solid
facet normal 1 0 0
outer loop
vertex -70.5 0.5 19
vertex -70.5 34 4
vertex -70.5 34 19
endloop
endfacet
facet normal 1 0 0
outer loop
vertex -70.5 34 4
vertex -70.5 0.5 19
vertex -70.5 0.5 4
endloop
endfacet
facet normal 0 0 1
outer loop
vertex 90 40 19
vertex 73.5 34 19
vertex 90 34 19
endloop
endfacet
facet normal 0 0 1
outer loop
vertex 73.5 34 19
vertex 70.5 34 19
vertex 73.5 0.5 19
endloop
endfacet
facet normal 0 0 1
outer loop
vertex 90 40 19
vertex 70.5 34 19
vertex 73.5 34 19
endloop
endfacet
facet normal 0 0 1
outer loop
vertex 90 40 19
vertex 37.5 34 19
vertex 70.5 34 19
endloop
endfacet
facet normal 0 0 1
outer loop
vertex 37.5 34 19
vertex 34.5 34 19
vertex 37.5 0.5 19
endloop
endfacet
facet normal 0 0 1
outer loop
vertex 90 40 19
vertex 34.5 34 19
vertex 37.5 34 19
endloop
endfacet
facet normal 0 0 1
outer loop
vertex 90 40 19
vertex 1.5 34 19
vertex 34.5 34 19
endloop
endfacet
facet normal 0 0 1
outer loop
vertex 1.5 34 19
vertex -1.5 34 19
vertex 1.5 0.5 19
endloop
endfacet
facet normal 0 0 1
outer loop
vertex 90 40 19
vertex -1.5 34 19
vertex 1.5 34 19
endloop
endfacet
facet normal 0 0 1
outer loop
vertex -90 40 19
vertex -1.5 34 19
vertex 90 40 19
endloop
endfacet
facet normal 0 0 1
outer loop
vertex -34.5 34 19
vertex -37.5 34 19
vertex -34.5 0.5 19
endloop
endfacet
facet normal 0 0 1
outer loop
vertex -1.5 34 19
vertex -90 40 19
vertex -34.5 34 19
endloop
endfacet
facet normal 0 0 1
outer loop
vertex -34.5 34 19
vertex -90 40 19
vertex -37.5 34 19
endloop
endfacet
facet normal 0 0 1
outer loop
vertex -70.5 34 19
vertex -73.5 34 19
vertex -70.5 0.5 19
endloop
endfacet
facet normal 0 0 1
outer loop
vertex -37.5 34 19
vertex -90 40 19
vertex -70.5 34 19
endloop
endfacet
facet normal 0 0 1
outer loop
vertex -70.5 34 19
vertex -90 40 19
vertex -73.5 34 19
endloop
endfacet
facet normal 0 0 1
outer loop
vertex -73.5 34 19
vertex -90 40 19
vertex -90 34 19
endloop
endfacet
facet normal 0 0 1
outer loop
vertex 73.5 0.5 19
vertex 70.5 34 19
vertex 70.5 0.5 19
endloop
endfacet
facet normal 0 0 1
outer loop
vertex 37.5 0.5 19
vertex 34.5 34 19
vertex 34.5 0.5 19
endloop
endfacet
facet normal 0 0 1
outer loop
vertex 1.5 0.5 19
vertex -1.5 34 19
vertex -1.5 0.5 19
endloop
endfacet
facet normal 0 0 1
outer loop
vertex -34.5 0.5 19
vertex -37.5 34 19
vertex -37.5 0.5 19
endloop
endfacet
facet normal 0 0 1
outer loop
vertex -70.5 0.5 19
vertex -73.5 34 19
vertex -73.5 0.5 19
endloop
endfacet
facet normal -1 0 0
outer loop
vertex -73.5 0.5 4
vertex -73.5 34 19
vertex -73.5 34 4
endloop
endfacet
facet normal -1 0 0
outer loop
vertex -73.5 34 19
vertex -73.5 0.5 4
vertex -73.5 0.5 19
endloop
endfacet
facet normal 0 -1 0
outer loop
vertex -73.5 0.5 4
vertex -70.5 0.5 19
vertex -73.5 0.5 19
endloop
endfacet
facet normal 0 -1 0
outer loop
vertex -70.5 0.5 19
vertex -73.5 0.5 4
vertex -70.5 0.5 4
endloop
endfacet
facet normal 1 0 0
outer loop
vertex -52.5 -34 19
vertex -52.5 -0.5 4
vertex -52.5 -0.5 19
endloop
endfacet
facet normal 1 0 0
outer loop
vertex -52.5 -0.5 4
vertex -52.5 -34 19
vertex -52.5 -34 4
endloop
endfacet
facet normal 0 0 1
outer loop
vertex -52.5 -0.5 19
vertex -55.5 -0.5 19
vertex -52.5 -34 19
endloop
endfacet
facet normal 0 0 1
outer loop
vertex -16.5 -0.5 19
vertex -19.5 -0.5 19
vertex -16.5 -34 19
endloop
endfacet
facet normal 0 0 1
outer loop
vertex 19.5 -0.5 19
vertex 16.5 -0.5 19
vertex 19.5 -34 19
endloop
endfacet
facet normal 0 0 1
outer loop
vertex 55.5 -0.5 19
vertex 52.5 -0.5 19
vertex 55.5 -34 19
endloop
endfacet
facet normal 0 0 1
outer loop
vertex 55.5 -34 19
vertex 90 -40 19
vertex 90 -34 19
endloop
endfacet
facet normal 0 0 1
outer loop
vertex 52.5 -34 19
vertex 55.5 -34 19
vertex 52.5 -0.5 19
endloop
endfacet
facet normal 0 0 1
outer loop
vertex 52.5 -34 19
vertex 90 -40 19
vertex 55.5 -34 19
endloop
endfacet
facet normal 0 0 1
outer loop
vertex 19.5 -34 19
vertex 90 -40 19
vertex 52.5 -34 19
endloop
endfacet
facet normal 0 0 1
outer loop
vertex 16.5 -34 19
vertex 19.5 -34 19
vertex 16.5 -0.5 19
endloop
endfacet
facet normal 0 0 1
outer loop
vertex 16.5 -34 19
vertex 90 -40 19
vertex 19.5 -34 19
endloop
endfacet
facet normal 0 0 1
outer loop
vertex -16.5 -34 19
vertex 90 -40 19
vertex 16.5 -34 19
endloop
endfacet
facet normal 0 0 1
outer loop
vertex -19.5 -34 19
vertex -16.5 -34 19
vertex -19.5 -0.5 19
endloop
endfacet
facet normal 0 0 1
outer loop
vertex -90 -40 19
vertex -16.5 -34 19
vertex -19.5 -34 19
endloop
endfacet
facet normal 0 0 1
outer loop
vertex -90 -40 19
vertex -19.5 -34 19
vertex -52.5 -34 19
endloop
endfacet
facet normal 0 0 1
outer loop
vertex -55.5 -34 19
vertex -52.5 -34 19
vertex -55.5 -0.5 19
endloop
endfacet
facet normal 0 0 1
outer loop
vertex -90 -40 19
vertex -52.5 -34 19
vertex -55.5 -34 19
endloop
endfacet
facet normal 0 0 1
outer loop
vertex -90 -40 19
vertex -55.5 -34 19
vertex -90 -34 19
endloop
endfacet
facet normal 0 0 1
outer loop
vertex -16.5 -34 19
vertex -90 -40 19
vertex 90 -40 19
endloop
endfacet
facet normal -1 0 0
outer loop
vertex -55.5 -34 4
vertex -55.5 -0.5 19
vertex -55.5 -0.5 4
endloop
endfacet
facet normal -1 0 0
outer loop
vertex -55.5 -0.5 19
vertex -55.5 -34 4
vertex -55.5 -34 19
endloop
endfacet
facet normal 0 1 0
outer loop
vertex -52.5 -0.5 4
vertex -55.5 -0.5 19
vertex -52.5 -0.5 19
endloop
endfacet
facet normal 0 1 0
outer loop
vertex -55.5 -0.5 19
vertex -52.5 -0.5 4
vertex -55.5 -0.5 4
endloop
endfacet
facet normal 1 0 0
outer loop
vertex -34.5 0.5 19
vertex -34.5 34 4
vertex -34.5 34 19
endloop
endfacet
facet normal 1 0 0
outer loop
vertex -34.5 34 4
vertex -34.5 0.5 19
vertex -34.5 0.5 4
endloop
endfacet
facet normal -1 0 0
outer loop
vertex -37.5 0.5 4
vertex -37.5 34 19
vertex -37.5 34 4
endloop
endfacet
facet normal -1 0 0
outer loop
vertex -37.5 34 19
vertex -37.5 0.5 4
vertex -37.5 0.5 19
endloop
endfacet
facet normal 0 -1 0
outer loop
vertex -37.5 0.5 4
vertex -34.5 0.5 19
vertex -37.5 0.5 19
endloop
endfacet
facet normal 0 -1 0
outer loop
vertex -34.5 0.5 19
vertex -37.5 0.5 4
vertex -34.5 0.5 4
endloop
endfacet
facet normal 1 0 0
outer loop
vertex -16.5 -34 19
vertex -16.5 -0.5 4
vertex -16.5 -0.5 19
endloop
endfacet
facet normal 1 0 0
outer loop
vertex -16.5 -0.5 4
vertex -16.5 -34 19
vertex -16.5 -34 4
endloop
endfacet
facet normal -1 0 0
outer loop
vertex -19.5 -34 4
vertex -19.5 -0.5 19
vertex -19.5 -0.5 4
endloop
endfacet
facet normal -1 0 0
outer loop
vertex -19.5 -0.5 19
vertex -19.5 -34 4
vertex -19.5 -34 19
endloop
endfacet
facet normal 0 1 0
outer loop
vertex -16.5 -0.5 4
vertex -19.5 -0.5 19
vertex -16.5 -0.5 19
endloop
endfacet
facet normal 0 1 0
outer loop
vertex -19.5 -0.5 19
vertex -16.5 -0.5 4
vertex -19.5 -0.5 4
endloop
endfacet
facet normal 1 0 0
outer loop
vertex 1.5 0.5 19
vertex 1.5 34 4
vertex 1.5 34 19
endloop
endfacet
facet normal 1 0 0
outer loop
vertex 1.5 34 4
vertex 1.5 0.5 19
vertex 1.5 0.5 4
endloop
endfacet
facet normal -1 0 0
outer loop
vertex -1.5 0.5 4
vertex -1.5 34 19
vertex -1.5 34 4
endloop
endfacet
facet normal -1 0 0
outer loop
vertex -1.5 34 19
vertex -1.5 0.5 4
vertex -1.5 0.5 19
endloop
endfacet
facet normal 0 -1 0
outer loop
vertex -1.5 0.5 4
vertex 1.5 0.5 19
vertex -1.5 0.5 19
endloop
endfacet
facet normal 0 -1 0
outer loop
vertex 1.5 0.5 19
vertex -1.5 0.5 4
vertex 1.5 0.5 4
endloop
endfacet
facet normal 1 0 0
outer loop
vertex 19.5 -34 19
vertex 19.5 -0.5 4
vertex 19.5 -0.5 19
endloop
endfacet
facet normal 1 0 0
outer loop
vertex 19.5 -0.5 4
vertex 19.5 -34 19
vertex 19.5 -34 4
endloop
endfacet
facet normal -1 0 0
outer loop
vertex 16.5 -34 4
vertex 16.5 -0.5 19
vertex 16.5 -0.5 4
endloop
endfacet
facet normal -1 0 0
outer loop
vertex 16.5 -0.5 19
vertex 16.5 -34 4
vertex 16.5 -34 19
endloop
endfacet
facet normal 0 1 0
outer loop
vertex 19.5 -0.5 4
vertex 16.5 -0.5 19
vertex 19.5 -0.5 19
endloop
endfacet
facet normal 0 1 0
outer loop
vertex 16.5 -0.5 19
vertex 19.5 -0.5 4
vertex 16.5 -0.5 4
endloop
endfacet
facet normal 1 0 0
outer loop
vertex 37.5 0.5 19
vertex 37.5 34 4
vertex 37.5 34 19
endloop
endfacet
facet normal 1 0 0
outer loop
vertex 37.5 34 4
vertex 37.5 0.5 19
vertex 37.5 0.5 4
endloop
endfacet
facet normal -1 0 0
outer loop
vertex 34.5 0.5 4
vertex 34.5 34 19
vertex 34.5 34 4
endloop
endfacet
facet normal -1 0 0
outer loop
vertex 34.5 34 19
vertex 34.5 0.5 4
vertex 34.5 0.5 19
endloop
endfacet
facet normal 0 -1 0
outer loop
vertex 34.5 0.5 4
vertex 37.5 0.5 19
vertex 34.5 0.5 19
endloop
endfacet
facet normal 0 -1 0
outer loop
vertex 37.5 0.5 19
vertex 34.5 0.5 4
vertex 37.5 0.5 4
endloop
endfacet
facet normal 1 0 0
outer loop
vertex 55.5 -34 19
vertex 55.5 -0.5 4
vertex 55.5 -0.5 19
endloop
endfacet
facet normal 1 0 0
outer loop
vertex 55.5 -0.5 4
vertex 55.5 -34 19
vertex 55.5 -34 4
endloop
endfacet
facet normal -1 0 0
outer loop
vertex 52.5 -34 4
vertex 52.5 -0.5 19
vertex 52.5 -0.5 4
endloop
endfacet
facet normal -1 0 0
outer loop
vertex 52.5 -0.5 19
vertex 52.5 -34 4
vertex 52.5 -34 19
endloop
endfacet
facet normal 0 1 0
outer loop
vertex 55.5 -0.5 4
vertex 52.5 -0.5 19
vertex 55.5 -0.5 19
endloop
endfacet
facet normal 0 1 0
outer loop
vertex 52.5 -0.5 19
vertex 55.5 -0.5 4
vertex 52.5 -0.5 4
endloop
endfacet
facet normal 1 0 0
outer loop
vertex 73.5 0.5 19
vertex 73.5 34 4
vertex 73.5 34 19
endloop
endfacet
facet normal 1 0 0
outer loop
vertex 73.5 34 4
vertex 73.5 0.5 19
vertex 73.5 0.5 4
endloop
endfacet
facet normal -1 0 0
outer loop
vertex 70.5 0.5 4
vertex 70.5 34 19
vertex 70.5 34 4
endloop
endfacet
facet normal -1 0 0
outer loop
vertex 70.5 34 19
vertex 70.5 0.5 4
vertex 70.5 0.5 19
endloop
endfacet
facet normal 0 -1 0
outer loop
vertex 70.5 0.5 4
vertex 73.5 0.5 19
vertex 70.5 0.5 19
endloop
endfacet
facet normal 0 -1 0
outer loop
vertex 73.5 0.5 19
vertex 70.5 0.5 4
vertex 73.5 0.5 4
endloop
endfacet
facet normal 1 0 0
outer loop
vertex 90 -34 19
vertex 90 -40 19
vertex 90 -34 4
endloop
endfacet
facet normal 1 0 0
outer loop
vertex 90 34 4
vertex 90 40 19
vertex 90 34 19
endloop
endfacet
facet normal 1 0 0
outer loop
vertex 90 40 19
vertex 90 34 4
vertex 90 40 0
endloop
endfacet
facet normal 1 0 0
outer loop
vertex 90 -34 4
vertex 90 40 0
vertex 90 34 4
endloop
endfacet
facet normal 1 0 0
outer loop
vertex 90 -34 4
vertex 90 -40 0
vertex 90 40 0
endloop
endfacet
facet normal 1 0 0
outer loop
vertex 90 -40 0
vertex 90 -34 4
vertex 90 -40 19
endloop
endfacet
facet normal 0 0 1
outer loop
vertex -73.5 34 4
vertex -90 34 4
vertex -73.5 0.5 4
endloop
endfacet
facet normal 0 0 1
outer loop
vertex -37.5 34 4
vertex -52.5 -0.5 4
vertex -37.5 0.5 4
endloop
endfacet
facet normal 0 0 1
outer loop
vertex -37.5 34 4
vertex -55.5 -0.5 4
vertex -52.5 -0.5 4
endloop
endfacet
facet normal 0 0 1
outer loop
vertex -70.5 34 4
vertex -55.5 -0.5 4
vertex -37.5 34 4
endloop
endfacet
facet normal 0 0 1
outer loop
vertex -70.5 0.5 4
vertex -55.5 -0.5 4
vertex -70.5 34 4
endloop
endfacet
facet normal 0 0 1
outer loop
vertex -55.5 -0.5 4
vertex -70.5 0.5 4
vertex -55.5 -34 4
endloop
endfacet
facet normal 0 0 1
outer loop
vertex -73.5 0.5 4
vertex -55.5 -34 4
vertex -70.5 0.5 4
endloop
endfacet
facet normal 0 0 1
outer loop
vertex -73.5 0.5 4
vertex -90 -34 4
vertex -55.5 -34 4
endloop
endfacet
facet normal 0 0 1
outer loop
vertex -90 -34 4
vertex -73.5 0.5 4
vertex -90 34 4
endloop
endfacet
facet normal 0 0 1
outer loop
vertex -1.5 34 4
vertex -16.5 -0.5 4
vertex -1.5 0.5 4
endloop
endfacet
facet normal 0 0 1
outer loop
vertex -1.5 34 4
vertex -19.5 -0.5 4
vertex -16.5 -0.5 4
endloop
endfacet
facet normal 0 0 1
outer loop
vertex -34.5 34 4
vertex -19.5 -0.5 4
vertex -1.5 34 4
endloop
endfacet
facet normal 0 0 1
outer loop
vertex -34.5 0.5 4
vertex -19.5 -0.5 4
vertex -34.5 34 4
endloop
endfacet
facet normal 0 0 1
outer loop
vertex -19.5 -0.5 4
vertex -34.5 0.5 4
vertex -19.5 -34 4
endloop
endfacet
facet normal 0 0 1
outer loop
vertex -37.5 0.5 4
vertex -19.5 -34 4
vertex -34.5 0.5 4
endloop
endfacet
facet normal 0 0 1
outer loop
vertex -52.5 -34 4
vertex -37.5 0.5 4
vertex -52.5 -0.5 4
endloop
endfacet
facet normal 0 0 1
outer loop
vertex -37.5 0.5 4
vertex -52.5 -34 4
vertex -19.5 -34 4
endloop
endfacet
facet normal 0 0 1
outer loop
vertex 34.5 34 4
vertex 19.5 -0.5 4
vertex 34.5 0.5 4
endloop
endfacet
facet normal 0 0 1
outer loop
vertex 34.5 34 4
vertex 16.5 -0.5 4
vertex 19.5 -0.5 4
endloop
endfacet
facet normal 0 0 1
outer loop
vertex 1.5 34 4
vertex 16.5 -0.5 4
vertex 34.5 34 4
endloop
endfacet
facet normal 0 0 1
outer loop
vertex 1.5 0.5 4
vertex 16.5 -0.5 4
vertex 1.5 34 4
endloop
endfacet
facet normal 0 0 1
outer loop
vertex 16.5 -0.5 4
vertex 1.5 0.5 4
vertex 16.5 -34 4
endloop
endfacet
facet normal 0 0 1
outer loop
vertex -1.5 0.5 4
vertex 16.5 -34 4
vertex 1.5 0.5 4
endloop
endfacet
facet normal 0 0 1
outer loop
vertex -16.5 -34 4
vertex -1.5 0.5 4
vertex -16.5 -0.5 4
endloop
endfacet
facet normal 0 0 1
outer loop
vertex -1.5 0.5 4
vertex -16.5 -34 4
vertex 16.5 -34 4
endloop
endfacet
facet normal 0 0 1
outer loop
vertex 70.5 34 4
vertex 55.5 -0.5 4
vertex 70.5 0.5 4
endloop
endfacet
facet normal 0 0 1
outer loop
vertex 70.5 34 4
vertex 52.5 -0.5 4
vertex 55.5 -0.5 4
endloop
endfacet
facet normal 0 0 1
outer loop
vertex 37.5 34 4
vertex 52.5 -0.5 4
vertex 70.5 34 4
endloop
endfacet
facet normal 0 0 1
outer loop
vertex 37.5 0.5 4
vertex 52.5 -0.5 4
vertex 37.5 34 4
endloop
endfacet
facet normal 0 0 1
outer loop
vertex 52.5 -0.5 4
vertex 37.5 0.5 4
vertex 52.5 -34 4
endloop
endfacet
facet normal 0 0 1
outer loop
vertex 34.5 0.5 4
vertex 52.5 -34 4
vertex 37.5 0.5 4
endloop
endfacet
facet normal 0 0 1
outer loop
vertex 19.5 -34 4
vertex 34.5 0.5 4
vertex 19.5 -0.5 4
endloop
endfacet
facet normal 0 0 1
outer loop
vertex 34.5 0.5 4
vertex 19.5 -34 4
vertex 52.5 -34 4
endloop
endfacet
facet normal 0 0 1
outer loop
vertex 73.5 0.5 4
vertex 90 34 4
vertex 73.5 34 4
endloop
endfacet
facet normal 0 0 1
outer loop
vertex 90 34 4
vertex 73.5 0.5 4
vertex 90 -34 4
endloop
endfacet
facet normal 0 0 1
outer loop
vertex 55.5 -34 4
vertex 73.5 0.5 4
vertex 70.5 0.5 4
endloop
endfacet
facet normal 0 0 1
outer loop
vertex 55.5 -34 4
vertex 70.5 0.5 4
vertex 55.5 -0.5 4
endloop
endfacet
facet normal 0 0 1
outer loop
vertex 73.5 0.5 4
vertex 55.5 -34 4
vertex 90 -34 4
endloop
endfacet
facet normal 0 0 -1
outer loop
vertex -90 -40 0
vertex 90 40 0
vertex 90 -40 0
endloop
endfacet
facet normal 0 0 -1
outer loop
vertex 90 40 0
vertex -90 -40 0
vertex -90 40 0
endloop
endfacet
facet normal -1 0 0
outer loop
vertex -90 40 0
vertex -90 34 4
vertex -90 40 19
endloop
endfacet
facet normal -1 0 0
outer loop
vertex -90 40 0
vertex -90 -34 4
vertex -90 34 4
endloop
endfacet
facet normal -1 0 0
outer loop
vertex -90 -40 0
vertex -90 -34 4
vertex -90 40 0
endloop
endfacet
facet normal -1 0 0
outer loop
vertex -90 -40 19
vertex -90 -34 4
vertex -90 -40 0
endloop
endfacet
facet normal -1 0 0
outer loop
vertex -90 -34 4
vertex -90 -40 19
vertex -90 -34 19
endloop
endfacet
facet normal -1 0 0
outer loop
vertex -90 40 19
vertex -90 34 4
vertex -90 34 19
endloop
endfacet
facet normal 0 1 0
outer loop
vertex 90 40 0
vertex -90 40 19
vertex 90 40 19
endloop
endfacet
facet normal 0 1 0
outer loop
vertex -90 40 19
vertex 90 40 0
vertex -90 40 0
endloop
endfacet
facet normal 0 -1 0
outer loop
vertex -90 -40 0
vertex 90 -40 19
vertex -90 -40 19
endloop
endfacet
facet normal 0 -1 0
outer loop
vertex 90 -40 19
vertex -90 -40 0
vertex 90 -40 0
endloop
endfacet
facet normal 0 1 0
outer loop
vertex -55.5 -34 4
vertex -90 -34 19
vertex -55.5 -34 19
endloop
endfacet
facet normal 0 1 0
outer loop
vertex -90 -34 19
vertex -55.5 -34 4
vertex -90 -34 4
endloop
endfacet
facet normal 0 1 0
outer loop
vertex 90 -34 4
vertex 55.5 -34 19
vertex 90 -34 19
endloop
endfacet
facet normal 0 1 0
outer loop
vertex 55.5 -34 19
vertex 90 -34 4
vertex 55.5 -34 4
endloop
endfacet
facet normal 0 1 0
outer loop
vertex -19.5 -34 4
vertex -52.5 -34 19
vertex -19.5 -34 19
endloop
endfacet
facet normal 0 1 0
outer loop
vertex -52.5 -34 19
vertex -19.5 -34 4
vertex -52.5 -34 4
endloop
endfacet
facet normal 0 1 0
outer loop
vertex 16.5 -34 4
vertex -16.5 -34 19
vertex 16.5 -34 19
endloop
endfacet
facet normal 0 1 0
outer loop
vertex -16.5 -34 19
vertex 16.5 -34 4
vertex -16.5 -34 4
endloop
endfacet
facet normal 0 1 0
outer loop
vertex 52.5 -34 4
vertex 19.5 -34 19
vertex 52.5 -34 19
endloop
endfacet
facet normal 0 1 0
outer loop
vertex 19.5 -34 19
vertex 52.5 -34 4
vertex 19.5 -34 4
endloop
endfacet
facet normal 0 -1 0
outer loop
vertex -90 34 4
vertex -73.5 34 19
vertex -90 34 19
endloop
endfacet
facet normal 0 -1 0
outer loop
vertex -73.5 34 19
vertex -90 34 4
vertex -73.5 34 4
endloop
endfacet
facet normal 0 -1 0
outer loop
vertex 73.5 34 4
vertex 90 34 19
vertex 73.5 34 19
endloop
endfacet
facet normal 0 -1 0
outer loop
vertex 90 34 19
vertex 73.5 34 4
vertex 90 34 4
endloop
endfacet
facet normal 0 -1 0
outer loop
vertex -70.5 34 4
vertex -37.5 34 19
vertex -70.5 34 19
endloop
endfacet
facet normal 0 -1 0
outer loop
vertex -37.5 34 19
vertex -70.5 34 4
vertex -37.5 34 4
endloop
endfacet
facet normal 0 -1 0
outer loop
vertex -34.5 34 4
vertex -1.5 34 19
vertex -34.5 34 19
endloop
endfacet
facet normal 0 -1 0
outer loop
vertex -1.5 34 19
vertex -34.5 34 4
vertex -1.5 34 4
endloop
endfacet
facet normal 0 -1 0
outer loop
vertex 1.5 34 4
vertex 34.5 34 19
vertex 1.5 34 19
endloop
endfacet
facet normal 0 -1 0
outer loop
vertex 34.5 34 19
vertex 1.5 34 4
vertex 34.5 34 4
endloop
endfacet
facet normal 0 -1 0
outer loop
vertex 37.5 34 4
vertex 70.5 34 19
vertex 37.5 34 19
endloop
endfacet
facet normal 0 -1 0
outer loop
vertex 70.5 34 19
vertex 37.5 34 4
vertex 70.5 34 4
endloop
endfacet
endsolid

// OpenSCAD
$fn = 32;

// ----------------------------------------------------------------------
// Rib frame 180 x 80 x 19
// 9 ribs at 18 mm pitch, staggered
// ----------------------------------------------------------------------

// --- parameters (mm) ---
frame = [180, 80, 4];  // base plate size (x, y, z)
rail_w = 6;            // side rail width
ribs = 9;              // number of ribs
rib_t = 3;             // rib thickness
rib_h = 15;            // rib height above the base plate
pitch = 18;            // pitch between rib centres

// --- derived feature positions (mm) ---
span = (ribs - 1) * pitch;          // = 144   distance between the outer ribs
origin_x = -span / 2;               // = -72   X of the first rib
rib_len = frame[1] / 2 - rail_w + 0.5;  // = 34.5   length of a staggered rib
rib_y = 0.5 + rib_len / 2;          // = 17.75   Y of a staggered rib centre
row_offset = 2 * rib_y;             // = 35.5   distance between the two rows
feature_centers = [
  [origin_x + 0 * pitch, rib_y],
  [origin_x + 1 * pitch, -rib_y],
  [origin_x + 2 * pitch, rib_y],
  [origin_x + 3 * pitch, -rib_y],
  [origin_x + 4 * pitch, rib_y],
  [origin_x + 5 * pitch, -rib_y],
  [origin_x + 6 * pitch, rib_y],
  [origin_x + 7 * pitch, -rib_y],
  [origin_x + 8 * pitch, rib_y]
];   // rib centre line, drives the rib loop

// base plate, two side rails, then the ribs read straight off feature_centers
union() {
  translate([-frame[0] / 2, -frame[1] / 2, 0]) cube(frame);
  translate([-frame[0] / 2, -frame[1] / 2, 0]) cube([frame[0], rail_w, frame[2] + rib_h]);
  translate([-frame[0] / 2, frame[1] / 2 - rail_w, 0]) cube([frame[0], rail_w, frame[2] + rib_h]);
  for (centre = feature_centers)
    translate([centre[0] - rib_t / 2, centre[1] - rib_len / 2, frame[2] - 1])
      cube([rib_t, rib_len, rib_h + 1]);
}
